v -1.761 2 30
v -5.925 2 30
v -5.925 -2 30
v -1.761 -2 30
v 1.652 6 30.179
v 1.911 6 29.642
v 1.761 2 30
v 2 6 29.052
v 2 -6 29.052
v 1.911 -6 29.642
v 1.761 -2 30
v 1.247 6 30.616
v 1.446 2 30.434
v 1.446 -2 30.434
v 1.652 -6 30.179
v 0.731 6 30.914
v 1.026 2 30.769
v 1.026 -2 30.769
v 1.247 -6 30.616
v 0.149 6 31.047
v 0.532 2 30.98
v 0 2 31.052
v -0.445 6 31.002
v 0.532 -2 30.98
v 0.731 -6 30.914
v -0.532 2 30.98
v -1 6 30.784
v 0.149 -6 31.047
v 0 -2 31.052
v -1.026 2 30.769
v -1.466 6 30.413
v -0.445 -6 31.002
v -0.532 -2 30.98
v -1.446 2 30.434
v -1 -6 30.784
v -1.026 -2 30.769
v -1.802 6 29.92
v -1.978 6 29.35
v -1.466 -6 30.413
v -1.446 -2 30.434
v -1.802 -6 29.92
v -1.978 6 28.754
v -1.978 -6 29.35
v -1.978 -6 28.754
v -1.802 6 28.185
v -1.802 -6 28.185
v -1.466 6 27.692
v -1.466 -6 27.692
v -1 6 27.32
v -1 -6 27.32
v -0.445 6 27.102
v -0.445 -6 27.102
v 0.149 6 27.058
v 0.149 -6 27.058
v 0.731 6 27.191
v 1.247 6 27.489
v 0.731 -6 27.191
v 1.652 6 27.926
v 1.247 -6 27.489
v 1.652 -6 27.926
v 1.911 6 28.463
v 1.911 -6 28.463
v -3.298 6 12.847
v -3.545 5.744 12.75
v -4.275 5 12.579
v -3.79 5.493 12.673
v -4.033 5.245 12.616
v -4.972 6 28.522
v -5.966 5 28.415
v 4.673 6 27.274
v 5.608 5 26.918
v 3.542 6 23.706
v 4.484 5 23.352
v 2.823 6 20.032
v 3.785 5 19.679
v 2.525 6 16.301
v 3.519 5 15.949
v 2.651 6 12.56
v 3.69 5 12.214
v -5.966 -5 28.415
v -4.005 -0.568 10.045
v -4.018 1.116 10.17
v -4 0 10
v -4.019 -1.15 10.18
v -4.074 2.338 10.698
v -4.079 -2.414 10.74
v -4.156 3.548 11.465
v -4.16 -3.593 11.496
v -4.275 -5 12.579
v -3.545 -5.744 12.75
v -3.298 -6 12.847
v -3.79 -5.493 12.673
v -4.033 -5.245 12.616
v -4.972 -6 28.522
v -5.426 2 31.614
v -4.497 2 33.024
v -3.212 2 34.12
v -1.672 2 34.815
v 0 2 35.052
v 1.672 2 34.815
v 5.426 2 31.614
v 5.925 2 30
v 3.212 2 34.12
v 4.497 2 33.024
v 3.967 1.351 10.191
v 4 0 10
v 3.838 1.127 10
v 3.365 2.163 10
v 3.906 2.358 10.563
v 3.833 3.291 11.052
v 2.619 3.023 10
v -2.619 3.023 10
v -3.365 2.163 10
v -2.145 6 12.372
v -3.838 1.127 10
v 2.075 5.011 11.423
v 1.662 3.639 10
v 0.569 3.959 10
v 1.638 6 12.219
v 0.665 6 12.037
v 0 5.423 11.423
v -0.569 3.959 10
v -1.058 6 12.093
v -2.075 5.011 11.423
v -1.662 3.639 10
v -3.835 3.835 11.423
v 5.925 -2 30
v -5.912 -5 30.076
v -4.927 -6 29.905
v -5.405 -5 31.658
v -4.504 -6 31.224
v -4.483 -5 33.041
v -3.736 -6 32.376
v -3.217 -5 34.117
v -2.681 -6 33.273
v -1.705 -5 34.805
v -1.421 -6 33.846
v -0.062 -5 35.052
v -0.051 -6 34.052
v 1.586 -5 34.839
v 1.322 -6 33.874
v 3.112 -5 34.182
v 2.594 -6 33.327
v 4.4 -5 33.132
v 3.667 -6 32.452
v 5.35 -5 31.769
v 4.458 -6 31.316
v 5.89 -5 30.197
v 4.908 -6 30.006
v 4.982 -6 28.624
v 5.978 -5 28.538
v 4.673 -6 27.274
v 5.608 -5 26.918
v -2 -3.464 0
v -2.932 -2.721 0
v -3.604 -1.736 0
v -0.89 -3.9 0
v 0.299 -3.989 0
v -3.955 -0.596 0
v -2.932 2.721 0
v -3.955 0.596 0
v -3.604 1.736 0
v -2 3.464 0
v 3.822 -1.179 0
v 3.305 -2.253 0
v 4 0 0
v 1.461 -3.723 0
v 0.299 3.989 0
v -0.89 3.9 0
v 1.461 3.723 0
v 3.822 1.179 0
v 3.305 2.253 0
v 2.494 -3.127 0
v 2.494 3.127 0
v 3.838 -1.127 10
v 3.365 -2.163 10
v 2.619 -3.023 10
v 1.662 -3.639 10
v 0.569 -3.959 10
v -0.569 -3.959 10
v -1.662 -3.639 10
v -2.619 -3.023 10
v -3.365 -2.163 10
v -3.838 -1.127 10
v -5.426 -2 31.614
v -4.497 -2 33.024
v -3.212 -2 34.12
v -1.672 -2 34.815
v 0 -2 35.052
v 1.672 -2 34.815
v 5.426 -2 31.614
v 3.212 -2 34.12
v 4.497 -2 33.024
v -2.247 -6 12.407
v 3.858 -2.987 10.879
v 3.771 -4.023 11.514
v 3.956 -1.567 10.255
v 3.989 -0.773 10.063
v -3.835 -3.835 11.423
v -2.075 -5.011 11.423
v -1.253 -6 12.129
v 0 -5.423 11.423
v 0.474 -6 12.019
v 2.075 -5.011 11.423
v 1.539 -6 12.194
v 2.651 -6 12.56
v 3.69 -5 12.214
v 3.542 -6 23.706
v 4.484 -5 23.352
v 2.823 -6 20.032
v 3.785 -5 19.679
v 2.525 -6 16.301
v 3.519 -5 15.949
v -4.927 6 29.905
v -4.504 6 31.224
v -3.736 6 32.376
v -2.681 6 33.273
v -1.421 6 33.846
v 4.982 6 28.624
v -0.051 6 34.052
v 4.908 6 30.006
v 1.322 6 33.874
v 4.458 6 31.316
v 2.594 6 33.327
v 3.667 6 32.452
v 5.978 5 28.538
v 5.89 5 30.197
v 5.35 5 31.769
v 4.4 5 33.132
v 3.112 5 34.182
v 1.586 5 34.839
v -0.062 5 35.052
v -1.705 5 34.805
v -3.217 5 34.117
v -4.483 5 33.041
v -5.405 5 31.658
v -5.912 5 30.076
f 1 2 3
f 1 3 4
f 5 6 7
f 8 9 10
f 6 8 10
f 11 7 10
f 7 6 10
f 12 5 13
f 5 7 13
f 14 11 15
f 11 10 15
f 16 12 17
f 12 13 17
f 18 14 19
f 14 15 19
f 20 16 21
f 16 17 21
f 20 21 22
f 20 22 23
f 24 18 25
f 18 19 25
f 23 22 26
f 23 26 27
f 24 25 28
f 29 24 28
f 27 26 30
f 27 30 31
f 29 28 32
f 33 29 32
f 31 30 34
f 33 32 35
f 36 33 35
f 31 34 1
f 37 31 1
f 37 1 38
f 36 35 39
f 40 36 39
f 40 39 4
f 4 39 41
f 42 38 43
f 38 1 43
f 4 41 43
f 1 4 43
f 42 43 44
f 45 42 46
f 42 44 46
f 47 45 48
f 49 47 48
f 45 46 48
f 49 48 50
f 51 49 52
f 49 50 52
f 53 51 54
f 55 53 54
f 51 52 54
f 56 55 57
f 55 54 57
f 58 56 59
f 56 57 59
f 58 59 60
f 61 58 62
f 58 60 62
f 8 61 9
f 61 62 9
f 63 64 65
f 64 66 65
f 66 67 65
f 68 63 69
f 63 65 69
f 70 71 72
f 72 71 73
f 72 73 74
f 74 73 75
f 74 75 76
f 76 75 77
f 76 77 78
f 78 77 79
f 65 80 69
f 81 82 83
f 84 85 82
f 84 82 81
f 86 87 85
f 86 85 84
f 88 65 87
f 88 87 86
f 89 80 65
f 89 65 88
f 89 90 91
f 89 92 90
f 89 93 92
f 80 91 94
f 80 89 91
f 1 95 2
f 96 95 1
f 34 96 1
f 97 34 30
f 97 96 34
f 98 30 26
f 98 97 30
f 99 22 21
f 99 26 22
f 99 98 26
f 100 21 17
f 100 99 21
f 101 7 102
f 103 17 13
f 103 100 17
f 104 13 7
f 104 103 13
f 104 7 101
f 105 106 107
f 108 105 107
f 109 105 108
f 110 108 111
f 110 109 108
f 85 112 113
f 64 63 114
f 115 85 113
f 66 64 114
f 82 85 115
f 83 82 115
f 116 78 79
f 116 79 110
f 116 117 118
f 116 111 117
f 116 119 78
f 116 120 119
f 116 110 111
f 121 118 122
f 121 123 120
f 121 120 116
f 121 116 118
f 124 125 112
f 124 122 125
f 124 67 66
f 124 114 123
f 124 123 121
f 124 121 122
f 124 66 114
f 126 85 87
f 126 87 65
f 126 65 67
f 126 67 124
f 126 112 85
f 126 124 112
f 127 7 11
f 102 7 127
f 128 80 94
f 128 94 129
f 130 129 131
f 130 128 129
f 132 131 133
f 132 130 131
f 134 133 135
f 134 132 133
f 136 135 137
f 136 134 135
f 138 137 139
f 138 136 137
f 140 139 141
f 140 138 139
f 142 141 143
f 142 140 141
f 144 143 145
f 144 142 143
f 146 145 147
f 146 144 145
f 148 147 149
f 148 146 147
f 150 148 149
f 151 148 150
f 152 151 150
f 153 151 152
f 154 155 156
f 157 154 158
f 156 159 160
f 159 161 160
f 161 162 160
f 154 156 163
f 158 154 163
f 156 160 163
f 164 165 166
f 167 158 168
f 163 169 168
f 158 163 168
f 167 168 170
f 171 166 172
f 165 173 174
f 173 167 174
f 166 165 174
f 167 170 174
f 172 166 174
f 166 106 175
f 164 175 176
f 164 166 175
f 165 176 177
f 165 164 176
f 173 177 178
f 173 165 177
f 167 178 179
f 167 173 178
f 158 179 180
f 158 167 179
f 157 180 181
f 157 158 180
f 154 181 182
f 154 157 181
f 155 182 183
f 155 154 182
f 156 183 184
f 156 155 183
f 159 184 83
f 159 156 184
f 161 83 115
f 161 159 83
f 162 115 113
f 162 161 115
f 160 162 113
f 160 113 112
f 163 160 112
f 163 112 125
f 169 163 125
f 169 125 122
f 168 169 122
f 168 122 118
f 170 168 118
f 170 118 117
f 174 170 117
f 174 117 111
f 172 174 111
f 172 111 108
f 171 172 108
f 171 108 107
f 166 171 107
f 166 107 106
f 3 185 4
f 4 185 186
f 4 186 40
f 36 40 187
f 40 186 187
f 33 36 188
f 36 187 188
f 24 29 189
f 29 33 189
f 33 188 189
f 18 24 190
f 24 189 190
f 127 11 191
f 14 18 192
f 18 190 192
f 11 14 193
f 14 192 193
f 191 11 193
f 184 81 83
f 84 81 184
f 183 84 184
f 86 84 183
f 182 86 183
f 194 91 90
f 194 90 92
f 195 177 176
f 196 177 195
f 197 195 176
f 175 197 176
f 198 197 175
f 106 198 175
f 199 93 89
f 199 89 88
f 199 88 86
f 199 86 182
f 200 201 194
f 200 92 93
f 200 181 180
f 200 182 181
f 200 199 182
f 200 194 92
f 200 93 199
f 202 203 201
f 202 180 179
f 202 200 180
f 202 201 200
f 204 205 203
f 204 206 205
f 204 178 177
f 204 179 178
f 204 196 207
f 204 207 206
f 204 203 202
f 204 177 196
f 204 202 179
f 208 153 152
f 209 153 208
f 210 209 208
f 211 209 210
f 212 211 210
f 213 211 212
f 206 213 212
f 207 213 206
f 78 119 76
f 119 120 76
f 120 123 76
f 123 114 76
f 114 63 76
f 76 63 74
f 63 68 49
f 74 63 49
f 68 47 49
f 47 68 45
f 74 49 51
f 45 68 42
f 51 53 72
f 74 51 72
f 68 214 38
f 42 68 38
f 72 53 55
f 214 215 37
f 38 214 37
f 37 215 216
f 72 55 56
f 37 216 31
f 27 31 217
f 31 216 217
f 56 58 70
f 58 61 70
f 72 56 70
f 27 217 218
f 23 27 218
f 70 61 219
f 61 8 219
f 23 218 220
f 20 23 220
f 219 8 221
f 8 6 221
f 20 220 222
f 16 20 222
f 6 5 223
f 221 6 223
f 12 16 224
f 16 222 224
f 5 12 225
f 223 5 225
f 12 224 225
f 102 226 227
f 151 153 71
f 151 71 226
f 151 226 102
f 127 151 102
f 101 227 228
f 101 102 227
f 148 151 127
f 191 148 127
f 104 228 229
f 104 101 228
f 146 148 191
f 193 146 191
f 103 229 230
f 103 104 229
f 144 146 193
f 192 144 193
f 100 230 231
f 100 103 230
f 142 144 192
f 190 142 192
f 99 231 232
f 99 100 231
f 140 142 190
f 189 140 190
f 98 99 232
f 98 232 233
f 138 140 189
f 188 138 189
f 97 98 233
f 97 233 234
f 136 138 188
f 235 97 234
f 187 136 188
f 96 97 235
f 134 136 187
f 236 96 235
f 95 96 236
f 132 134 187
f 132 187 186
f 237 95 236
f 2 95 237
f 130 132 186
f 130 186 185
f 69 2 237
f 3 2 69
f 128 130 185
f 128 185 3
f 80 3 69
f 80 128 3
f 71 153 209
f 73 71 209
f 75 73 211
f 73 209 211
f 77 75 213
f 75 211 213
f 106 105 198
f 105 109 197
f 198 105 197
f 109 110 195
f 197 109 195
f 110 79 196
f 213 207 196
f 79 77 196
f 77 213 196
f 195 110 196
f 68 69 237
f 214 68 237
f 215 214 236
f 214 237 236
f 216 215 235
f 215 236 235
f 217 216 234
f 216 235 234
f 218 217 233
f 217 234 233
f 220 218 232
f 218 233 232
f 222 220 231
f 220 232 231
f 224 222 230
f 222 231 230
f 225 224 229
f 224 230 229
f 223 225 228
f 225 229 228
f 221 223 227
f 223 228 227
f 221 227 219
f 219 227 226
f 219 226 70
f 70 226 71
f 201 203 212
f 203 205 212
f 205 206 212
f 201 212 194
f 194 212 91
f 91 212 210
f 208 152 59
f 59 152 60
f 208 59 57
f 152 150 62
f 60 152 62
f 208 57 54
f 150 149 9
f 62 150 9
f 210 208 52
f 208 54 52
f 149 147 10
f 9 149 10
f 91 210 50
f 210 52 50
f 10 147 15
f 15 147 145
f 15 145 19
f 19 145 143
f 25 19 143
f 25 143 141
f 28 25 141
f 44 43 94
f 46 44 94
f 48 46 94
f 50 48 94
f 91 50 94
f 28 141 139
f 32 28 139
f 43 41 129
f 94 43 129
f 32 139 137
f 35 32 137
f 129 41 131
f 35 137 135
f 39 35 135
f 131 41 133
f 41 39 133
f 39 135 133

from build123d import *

# Parameters (mm, degrees)
SKETCH_R        = 10
PAD_DEPTH       = 40
SKETCH001_W     = 20
SKETCH001_H     = 4
POCKET_DEPTH    = 10
SKETCH003_R     = 10
SKETCH003_R_2   = 4
POCKET001_DEPTH = 10
SKETCH005_R     = 2
POCKET002_DEPTH = 38.001
SKETCH006_W     = 45.010599
SKETCH006_H     = 48.069569
POCKET003_DEPTH = 4.001
SKETCH009_W     = 22.304068
SKETCH009_H     = 42.809419
POCKET004_DEPTH = 4.001
CHAMFER_SIZE    = 1
CHAMFER001_SIZE = 1


with BuildPart() as part:
    # Sketch → Pad (new body)
    with BuildSketch(Plane.XY):
        Circle(SKETCH_R)
    extrude(amount=PAD_DEPTH)

    # Sketch001 (on Face3 of Pad) → Pocket (cut)
    with BuildSketch(Plane.XY.offset(40)):
        Rectangle(SKETCH001_W, SKETCH001_H)
    extrude(amount=-POCKET_DEPTH, mode=Mode.SUBTRACT)

    # Sketch003 (on Face2 of Pocket) → Pocket001 (cut)
    with BuildSketch(Plane(origin=(0, 0, 0), x_dir=(1, 0, 0), z_dir=(0, 0, -1))):
        Circle(SKETCH003_R)
        Circle(SKETCH003_R_2, mode=Mode.SUBTRACT)
    extrude(amount=-POCKET001_DEPTH, mode=Mode.SUBTRACT)

    # Sketch005 (on DatumPlane) → Pocket002 (cut, through all)
    with BuildSketch(Plane.XZ.offset(28)):
        with Locations((0, 29.052325)):
            Circle(SKETCH005_R)
        with BuildLine():
            ThreePointArc((5.607622, 26.918181), (0.769749, 35.002744), (-5.966094, 28.415363))
            Line((-5.966094, 28.415363), (-4, 10))
            Line((-4, 10), (-20.111568, 10))
            Line((-20.111568, 10), (-20.111568, 42.267994))
            Line((-20.111568, 42.267994), (18.230141, 42.267994))
            Line((18.230141, 42.267994), (18.230141, 10))
            Line((18.230141, 10), (4, 10))
            ThreePointArc((5.607622, 26.918181), (3.659522, 18.567825), (4, 10))
        make_face()
    extrude(amount=-POCKET002_DEPTH, mode=Mode.SUBTRACT)

    # Sketch006 (on DatumPlane) → Pocket003 (cut, through all)
    with BuildSketch(Plane(origin=(0, -6, 0), x_dir=(-1, 0, 0), z_dir=(0, 1, 0))):
        with Locations((-1.18355, 18.119115)):
            Rectangle(SKETCH006_W, SKETCH006_H)
    extrude(amount=-POCKET003_DEPTH, mode=Mode.SUBTRACT)

    # Sketch008 → Groove (revolve, cut)
    with BuildSketch(Plane.XZ):
        Polygon((-4, 10), (-11.309977, 17.309977), (-11.309977, 10), align=None)
    revolve(axis=Axis((0, 0, 0), (0, 0, 1)), mode=Mode.SUBTRACT)

    # Sketch009 (on DatumPlane) → Pocket004 (cut, through all)
    with BuildSketch(Plane.XZ.offset(-6)):
        with Locations((-2.652106, 20.426258)):
            Rectangle(SKETCH009_W, SKETCH009_H)
    extrude(amount=-POCKET004_DEPTH, mode=Mode.SUBTRACT)

    # Chamfer
    chamfer_edges = [part.edges().sort_by_distance(p)[0] for p in [
        (3.83859, -6, 20.072708),
        (0.769749, -6, 35.002744),
        (-5.165605, -6, 20.917609),
    ]]
    chamfer(chamfer_edges, length=CHAMFER_SIZE)

    # Chamfer001
    chamfer001_edges = [part.edges().sort_by_distance(p)[0] for p in [
        (3.83859, 6, 20.072708),
        (0.769749, 6, 35.002744),
        (-5.165605, 6, 20.917609),
    ]]
    chamfer(chamfer001_edges, length=CHAMFER001_SIZE)


solid = part.part
